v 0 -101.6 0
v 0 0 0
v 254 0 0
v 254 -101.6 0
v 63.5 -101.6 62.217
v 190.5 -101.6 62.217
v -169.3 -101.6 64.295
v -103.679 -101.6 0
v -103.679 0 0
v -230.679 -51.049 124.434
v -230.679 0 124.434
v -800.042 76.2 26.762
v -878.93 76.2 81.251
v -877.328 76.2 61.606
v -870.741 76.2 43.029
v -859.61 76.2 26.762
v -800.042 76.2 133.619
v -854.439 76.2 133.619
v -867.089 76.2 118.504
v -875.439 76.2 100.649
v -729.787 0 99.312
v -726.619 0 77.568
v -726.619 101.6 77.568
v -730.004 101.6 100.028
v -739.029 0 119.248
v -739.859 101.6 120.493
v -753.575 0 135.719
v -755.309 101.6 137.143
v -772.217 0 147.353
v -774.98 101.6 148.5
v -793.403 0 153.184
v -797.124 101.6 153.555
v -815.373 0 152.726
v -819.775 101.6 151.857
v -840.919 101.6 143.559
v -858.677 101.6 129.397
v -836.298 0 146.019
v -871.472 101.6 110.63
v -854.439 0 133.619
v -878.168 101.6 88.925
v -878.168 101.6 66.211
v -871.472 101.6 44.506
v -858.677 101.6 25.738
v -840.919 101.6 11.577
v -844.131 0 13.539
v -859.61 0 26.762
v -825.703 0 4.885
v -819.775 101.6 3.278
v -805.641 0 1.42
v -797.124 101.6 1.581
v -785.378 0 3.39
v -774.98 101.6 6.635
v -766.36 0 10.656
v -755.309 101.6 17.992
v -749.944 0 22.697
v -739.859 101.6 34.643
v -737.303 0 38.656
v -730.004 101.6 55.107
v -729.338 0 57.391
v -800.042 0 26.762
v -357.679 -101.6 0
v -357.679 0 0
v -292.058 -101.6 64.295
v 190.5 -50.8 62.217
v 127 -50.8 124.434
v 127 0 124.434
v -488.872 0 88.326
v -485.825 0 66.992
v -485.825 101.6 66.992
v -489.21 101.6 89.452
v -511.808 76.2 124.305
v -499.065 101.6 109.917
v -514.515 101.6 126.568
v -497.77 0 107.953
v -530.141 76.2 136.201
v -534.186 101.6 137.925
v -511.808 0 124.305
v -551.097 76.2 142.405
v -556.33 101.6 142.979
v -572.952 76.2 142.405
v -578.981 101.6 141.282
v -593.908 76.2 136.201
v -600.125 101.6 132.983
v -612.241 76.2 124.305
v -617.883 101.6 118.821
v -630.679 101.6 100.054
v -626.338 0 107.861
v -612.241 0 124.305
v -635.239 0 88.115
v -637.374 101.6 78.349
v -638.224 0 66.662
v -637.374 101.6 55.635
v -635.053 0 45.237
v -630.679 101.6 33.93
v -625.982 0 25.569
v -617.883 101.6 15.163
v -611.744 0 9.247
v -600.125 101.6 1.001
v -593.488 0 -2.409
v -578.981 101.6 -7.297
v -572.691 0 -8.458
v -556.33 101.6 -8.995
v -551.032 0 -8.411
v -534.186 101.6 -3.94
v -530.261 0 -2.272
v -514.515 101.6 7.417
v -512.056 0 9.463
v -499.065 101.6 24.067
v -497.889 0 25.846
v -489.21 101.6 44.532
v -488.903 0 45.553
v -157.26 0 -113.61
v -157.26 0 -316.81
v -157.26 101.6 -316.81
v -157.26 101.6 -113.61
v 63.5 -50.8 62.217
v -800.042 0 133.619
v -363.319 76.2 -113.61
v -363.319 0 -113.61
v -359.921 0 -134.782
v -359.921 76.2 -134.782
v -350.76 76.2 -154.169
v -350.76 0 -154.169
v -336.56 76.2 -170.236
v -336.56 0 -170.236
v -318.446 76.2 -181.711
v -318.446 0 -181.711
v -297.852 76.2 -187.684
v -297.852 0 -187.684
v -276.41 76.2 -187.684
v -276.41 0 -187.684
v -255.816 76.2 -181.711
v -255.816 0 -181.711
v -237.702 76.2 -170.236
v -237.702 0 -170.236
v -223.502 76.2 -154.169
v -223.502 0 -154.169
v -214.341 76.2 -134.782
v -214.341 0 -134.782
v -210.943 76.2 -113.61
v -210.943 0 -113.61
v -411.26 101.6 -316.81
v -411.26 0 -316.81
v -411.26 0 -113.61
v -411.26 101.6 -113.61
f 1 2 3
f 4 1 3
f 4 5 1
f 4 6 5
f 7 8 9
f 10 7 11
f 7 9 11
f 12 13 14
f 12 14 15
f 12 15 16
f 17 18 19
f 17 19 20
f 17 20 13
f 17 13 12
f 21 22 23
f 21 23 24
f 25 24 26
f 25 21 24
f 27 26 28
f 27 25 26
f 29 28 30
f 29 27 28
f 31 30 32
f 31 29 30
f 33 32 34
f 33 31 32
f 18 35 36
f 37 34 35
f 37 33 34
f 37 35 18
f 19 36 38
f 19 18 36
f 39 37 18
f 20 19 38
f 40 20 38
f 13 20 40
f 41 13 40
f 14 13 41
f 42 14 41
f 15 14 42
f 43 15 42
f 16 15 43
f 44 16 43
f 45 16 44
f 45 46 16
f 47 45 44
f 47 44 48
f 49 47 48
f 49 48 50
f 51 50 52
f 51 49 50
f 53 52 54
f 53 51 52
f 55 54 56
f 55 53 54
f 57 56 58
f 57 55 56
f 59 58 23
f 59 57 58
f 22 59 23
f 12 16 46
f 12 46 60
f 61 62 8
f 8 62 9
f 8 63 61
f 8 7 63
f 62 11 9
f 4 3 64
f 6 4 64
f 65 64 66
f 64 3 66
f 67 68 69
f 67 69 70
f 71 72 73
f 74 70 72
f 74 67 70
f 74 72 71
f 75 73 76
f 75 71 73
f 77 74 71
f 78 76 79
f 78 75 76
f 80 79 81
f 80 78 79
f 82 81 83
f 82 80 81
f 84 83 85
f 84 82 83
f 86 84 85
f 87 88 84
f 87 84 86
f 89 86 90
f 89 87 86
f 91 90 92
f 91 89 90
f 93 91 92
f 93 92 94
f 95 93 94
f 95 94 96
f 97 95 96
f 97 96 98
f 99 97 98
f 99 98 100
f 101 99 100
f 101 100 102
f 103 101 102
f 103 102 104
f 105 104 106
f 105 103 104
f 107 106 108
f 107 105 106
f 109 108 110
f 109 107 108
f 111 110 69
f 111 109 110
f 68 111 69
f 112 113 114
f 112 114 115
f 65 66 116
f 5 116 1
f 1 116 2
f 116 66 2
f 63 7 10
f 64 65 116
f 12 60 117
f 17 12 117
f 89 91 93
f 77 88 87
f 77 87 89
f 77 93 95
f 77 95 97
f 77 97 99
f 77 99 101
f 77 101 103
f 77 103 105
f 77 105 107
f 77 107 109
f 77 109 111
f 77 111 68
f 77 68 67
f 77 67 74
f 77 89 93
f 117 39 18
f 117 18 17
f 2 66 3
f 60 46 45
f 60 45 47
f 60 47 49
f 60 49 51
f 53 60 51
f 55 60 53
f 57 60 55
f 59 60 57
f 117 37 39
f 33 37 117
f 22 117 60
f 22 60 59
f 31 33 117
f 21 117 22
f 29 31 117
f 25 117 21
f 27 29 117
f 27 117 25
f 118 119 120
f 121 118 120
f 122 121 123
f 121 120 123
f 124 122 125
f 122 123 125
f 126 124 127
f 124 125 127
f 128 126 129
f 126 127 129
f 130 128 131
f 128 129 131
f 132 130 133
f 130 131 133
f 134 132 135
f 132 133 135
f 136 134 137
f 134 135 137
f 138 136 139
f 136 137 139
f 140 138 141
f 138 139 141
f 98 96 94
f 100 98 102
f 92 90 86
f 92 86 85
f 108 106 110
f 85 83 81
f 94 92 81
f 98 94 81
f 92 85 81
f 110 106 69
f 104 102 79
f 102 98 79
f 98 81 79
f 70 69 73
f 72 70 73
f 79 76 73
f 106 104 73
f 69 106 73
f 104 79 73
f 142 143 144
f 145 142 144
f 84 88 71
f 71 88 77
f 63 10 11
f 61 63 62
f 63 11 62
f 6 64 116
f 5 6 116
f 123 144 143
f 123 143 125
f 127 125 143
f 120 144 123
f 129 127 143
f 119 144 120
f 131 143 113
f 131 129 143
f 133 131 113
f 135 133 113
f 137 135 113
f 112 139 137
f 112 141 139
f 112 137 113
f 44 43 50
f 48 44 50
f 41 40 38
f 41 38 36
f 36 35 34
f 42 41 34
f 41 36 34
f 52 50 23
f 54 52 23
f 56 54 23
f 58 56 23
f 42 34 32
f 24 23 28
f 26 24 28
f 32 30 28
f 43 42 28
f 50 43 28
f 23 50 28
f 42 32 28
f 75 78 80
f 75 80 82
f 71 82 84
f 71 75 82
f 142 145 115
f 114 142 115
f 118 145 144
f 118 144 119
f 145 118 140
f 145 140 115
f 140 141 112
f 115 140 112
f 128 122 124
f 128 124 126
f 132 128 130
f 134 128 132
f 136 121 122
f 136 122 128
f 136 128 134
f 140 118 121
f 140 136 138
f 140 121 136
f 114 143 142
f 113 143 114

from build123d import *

# Parameters (mm, degrees)
F1_DEPTH  = 101.6
F2_DEPTH  = 50.8
F4_DEPTH  = 101.6
F8_DEPTH  = 63.5
F9_R      = 76.2
F10_DEPTH = 101.6
F11_W     = 138.8424634933
F11_H     = 72.9273408651
F12_DEPTH = 76.2
F13_R     = 76.2
F14_DEPTH = 101.6
F15_W     = 160.2847576141
F15_H     = 106.856547296
F16_DEPTH = 76.2
F17_W     = 254
F17_H     = 203.2
F18_DEPTH = 101.6
F19_R     = 76.2
F20_DEPTH = 76.2


with BuildPart() as f1:
    # F0 (on Front) → F1 (new body)
    with BuildSketch(Plane.XZ):
        Polygon((63.5, 62.2170394667), (0, 0), (254, 0), (190.5, 62.2170394667), align=None)
    extrude(amount=F1_DEPTH)

    # F0 (on Front) → F2 (join)
    with BuildSketch(Plane.XZ):
        Polygon((63.5, 62.2170394667), (0, 0), (254, 0), (190.5, 62.2170394667), align=None)
        Polygon((127, 124.4340789334), (63.5, 62.2170394667), (190.5, 62.2170394667), align=None)
    extrude(amount=F2_DEPTH)


with BuildPart() as f4:
    # F3 (on Front) → F4 (new body)
    with BuildSketch(Plane.XZ):
        Polygon((-357.6793918375, 0), (-103.6793918375, 0), (-230.6793918375, 124.4340789334), align=None)
    extrude(amount=F4_DEPTH)

    # F7 (on 3pt) → F8 (cut, symmetric)
    with BuildSketch(Plane.YZ.offset(-230.6793918375)):
        Polygon((-101.8185078442, 64.035332354), (-51.0185078442, 124.4698180237), (-101.8185078442, 124.4698180237), align=None)
    extrude(amount=F8_DEPTH, both=True, mode=Mode.SUBTRACT)


with BuildPart() as f10:
    # F9 (on Front) → F10 (new body)
    with BuildSketch(Plane.XZ):
        with Locations((-562.0247125626, 66.992148757)):
            Circle(F9_R)
    extrude(amount=-F10_DEPTH)

    # F11 (on Front) → F12 (cut)
    with BuildSketch(Plane.XZ):
        with Locations((-563.4106993675, 160.768315196)):
            Rectangle(F11_W, F11_H)
    extrude(amount=-F12_DEPTH, mode=Mode.SUBTRACT)


with BuildPart() as f14:
    # F13 (on Front) → F14 (new body)
    with BuildSketch(Plane.XZ):
        with Locations((-802.8185963631, 77.5676518679)):
            Circle(F13_R)
    extrude(amount=-F14_DEPTH)

    # F15 (on Front) → F16 (cut)
    with BuildSketch(Plane.XZ):
        with Locations((-880.1847100258, 80.1907256246)):
            Rectangle(F15_W, F15_H)
    extrude(amount=-F16_DEPTH, mode=Mode.SUBTRACT)


with BuildPart() as f18:
    # F17 (on Front) → F18 (new body)
    with BuildSketch(Plane.XZ):
        with Locations((-284.2599749565, -215.2100077792)):
            Rectangle(F17_W, F17_H)
    extrude(amount=-F18_DEPTH)

    # F19 (on Front) → F20 (cut)
    with BuildSketch(Plane.XZ):
        with Locations((-287.1308624744, -112.2424378991)):
            Circle(F19_R)
    extrude(amount=-F20_DEPTH, mode=Mode.SUBTRACT)


solid = Compound([f1.part, f4.part, f10.part, f14.part, f18.part])
